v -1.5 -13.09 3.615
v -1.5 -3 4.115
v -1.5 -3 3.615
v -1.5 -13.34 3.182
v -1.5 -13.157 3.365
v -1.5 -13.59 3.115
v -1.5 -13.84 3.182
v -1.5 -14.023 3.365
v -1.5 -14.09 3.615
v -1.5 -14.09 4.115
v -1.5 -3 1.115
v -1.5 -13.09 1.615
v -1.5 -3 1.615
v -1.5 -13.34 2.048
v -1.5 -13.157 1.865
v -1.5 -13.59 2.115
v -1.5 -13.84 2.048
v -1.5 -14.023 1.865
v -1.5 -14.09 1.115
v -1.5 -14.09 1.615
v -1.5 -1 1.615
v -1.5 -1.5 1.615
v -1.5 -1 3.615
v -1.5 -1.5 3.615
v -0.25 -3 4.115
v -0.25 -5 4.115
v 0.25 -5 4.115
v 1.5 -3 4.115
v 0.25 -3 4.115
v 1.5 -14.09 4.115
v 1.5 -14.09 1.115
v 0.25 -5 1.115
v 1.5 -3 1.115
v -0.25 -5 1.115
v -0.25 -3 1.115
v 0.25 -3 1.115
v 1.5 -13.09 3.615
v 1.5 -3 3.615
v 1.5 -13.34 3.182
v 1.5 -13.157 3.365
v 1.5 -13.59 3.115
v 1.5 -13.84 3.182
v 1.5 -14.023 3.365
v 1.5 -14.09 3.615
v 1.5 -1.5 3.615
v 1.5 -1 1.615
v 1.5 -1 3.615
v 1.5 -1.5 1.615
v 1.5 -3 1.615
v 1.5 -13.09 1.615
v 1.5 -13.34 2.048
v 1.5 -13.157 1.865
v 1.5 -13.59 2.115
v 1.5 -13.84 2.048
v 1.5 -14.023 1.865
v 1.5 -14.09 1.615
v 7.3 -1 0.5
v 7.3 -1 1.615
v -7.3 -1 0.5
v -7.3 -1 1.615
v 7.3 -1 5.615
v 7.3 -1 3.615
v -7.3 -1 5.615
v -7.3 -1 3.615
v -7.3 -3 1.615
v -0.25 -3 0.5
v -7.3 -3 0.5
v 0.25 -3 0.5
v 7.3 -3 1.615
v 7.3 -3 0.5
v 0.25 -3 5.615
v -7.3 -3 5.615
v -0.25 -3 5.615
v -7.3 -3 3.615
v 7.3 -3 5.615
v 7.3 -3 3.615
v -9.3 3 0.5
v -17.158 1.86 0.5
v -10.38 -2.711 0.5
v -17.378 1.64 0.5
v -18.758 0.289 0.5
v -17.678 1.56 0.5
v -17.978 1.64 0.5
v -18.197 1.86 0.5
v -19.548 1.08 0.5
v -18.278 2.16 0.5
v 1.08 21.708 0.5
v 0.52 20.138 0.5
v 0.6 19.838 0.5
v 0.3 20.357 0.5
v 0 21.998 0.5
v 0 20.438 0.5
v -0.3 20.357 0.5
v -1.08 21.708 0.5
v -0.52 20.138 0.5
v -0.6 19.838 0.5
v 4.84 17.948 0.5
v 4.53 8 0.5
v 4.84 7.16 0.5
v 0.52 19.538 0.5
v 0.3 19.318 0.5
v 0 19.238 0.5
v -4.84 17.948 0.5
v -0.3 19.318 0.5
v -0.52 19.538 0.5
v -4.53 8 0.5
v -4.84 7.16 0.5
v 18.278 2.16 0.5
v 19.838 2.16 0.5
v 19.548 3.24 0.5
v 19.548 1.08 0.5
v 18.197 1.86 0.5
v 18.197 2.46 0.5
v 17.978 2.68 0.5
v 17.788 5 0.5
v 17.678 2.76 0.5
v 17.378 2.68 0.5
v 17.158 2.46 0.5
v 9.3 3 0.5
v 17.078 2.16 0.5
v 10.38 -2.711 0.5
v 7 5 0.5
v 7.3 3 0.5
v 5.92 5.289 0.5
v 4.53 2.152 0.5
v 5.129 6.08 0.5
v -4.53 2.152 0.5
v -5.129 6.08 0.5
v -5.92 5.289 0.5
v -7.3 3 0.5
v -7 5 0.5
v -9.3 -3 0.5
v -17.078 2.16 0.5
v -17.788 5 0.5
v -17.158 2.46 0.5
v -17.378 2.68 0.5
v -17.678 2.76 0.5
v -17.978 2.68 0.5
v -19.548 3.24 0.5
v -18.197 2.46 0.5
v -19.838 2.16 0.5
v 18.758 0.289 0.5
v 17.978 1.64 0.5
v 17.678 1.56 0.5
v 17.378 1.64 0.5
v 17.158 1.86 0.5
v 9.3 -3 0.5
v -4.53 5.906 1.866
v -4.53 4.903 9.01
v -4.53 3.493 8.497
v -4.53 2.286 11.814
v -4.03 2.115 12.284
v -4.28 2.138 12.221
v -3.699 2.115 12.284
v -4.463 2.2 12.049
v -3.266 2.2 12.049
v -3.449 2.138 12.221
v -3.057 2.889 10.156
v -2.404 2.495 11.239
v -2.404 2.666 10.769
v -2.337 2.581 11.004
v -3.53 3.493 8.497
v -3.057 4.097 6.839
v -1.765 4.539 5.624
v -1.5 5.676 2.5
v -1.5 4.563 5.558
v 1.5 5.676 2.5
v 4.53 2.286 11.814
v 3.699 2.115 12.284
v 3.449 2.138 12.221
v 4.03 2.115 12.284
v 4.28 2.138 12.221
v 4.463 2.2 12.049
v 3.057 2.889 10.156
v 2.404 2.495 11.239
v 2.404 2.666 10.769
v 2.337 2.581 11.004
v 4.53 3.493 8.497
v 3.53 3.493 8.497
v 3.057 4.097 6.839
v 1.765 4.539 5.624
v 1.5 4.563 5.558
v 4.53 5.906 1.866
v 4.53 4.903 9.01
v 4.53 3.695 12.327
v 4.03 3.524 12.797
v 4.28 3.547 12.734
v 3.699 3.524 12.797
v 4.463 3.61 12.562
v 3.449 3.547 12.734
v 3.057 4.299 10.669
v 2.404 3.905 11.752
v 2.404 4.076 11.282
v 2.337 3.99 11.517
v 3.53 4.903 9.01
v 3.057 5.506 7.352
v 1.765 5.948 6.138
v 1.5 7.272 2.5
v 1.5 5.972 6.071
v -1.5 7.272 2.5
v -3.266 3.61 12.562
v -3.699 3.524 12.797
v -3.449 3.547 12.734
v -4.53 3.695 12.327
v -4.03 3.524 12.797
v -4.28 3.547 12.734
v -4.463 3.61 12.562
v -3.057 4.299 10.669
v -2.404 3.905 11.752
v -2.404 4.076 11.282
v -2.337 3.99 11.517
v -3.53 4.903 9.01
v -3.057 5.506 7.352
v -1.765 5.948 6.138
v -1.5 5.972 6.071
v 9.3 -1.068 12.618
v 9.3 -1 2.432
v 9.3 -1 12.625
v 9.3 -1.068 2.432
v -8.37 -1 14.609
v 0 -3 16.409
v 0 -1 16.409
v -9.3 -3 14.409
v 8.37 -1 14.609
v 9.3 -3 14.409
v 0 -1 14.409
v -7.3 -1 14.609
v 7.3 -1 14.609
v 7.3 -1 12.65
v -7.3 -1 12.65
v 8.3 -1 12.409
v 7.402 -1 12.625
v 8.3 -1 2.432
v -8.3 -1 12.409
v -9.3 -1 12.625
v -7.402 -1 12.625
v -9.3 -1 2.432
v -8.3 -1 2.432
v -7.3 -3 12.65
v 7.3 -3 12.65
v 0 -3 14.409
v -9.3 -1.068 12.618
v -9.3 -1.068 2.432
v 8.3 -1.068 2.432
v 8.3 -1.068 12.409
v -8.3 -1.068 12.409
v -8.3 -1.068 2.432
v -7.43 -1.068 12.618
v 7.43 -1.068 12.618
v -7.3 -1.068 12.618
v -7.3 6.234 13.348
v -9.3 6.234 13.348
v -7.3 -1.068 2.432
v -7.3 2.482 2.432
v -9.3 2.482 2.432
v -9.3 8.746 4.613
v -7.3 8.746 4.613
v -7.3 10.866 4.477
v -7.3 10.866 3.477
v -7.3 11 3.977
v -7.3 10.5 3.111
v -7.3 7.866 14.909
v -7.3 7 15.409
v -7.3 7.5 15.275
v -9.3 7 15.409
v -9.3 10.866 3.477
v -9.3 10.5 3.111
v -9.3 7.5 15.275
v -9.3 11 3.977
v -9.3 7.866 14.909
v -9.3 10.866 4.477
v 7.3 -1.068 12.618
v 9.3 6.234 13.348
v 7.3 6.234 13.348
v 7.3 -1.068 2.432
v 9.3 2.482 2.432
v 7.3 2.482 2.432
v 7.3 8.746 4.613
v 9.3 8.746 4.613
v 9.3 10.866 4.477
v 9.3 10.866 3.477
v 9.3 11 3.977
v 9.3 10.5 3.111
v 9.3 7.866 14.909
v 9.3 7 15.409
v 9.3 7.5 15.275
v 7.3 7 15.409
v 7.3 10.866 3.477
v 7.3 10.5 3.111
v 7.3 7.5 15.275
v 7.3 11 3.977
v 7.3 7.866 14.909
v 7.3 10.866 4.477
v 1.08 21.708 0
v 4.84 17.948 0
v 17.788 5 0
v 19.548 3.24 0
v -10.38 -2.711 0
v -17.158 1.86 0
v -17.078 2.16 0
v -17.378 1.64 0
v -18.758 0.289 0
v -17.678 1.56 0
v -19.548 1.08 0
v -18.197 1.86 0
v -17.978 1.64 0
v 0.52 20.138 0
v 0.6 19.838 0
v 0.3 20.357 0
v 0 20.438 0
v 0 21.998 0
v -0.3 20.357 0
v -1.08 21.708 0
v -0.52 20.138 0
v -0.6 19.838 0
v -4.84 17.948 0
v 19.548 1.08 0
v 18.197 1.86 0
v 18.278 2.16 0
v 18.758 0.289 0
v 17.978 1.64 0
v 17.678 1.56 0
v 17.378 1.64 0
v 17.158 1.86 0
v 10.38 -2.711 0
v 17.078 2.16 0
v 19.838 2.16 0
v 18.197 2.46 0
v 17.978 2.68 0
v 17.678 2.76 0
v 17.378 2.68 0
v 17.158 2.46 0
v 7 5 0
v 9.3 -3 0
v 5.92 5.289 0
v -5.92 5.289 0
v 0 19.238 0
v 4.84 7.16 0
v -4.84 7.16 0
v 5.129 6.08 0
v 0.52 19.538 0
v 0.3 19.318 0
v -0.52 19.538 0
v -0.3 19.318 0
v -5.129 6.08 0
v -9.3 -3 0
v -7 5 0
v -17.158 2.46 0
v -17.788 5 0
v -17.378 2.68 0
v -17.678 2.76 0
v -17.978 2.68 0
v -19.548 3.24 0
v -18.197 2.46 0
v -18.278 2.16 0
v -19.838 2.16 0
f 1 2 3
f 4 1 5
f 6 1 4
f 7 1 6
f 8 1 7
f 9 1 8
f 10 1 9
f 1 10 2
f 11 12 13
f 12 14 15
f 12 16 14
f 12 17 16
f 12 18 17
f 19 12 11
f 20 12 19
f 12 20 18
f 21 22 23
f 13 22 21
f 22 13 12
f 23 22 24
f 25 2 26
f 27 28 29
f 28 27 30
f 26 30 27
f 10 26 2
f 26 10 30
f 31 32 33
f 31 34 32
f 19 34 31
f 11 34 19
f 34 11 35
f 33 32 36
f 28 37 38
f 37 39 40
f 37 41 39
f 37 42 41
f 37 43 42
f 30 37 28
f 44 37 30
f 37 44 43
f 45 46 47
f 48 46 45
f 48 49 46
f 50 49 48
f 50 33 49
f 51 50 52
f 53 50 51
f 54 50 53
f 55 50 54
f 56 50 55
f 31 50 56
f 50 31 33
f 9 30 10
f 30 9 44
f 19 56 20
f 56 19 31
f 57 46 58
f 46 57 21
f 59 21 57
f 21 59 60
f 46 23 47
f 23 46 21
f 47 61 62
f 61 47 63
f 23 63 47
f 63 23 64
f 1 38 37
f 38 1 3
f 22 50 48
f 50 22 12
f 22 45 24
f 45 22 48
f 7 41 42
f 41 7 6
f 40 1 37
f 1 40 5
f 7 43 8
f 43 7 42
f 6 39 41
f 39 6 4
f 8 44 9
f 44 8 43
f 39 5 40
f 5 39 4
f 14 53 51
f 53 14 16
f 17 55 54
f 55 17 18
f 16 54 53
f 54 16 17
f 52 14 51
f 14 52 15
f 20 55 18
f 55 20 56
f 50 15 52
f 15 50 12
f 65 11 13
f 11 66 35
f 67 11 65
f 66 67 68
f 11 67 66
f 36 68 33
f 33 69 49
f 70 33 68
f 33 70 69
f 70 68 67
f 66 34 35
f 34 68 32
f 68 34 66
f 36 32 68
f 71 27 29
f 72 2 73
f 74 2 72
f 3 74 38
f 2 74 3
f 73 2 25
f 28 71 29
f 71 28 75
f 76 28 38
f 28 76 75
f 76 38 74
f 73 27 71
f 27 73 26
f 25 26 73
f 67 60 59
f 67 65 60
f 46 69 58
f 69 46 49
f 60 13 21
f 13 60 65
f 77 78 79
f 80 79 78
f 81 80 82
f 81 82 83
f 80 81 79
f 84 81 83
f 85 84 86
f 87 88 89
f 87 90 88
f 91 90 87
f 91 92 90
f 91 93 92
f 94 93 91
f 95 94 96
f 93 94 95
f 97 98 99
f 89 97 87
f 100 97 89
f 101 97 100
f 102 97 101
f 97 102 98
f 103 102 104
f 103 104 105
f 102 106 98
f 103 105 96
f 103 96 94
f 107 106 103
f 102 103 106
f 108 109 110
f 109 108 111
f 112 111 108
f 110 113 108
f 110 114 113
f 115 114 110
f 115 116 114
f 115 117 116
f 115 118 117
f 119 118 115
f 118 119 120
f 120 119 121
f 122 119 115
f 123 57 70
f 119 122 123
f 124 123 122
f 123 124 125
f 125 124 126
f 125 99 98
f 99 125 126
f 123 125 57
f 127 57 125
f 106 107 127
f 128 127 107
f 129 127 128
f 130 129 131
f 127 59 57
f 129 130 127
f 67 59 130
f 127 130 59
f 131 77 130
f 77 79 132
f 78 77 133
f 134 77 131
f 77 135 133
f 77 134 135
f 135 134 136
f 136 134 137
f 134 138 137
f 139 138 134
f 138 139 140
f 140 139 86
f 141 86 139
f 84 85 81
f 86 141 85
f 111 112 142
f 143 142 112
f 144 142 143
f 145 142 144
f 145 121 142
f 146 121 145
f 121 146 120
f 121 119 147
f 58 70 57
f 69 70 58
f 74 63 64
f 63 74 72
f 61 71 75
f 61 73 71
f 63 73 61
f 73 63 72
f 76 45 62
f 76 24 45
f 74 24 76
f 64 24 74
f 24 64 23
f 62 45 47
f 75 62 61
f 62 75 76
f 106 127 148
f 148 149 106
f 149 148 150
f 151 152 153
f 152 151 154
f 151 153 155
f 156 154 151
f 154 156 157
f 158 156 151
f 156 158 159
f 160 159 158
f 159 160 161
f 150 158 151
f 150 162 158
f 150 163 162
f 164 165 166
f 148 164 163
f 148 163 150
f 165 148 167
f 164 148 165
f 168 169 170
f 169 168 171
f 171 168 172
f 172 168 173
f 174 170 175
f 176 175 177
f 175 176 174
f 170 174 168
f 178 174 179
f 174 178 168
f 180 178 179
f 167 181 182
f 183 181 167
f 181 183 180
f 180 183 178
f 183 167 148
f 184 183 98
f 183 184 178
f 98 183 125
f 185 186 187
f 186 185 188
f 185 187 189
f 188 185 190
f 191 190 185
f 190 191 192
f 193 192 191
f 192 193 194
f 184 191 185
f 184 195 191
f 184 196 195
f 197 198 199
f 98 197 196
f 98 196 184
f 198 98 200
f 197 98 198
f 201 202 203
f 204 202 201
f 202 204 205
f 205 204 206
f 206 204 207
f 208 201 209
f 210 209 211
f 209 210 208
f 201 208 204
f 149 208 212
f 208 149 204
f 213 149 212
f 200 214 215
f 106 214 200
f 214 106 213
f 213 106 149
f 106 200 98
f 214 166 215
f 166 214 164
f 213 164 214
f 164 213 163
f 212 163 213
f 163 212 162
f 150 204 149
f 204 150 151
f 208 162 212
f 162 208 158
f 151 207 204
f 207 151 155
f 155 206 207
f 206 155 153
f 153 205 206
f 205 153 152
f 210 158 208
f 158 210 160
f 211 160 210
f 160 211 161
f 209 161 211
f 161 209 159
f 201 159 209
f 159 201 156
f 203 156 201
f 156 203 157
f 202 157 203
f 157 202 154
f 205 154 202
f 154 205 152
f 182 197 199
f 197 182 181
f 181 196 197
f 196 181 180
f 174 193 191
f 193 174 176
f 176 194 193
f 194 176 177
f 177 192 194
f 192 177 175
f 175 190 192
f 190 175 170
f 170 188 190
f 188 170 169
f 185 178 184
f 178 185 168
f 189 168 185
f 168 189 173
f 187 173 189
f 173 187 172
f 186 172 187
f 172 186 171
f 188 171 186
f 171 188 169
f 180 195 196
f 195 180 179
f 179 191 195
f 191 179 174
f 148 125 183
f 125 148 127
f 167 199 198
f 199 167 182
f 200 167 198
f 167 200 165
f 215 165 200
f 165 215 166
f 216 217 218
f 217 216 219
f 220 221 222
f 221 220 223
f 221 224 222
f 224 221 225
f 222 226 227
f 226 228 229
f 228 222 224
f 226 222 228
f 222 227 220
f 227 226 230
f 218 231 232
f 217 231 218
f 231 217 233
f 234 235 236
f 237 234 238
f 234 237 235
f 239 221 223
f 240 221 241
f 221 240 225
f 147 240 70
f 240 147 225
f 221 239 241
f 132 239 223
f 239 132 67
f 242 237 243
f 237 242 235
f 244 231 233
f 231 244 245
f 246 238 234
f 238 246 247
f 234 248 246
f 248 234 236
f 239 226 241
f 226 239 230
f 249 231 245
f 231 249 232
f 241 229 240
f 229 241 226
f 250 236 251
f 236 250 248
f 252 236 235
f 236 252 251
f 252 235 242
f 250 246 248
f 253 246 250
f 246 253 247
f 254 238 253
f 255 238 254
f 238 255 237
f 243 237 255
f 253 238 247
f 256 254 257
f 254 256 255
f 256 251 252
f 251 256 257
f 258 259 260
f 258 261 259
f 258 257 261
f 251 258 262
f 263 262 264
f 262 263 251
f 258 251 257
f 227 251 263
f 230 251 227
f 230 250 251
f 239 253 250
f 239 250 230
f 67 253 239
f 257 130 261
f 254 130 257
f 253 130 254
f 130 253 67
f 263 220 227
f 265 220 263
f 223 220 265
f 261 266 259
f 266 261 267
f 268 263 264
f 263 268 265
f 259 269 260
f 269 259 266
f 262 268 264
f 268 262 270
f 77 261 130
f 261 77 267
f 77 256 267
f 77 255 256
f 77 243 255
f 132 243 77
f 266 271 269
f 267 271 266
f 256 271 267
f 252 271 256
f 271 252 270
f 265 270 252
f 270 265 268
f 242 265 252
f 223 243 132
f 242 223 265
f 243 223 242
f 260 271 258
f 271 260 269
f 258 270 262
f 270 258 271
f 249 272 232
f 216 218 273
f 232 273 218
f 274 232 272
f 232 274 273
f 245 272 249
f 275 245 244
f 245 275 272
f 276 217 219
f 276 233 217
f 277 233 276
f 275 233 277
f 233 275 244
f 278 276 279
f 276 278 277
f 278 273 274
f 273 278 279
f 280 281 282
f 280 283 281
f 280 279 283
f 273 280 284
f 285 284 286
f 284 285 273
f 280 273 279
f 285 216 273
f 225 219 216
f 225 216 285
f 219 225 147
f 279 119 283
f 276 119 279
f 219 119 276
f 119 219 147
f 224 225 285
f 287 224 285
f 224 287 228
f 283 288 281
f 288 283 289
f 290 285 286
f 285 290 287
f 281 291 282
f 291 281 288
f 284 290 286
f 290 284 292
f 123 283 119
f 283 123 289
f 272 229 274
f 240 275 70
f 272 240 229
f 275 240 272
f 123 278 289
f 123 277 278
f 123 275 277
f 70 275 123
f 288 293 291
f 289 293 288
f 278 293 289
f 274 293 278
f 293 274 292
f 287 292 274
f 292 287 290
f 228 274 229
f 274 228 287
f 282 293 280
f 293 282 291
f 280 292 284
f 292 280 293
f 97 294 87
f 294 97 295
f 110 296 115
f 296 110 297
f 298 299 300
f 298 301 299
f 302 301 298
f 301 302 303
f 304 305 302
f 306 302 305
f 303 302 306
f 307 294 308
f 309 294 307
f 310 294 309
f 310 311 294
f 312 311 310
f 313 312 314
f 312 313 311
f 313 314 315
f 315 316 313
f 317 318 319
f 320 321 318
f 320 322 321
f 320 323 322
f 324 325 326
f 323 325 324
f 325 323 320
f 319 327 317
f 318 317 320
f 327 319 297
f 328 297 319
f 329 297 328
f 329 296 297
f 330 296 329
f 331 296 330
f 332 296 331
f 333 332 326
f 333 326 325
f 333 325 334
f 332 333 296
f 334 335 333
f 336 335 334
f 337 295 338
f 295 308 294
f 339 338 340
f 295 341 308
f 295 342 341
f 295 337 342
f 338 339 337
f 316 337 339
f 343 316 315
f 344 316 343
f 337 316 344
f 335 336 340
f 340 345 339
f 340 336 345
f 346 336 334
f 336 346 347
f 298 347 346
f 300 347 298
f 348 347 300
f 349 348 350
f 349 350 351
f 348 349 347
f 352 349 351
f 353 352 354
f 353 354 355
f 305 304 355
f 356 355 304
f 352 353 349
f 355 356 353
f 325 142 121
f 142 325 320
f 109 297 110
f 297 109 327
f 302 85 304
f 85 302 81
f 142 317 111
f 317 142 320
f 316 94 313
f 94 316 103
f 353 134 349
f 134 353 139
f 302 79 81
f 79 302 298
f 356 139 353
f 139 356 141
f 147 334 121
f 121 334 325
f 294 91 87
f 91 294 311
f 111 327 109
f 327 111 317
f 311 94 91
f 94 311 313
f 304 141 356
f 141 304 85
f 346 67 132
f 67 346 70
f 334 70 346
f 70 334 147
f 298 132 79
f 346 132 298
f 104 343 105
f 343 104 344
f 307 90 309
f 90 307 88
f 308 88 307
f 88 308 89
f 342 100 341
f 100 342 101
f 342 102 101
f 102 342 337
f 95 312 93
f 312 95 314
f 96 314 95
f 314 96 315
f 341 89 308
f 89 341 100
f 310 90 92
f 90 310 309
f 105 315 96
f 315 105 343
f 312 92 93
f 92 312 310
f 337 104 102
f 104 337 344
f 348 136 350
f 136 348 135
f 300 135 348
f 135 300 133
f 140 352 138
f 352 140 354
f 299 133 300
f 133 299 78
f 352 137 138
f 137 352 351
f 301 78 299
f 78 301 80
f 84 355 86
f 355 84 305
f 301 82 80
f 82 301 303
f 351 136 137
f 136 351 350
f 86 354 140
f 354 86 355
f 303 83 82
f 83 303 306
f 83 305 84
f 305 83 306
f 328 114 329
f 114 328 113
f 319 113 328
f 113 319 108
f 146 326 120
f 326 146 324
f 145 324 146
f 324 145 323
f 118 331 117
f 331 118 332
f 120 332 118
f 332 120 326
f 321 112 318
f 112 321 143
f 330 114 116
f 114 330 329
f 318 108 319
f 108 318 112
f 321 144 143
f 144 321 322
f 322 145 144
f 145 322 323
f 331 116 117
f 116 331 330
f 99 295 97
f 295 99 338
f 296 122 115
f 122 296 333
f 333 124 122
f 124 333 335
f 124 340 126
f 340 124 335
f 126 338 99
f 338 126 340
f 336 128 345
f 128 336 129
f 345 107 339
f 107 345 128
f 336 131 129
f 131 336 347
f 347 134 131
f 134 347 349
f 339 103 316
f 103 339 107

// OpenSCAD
$fn = 12;

union() {
	translate(v = [0, -3, 0]) {
		union() {
			translate(v = [0, 2, 0.5000000000]) {
				rotate(a = [0, 0, 180]) {
					union() {
						translate(v = [-7.3000000000, 0, 0]) {
							cube(size = [14.6000000000, 2, 1.1150000000]);
						}
						translate(v = [-1.5000000000, 0, 0.6150000000]) {
							union() {
								difference() {
									cube(size = [3, 13.0900000000, 3.0000000000]);
									translate(v = [0, 0.5000000000, 0.5000000000]) {
										cube(size = [5, 13.0900000000, 2]);
									}
								}
								translate(v = [0, 12.5900000000, 2.5000000000]) {
									rotate(a = [0, 90, 0]) {
										cylinder(h = 3, r = 0.5000000000);
									}
								}
								translate(v = [0, 12.5900000000, 0.5000000000]) {
									rotate(a = [0, 90, 0]) {
										cylinder(h = 3, r = 0.5000000000);
									}
								}
								translate(v = [1.2500000000, 4, 0]) {
									rotate(a = [0, 180, 180]) {
										polyhedron(faces = [[0, 1, 2, 3], [5, 4, 3, 2], [0, 4, 5, 1], [0, 3, 4], [5, 2, 1]], points = [[0, 0, 0], [0.5000000000, 0, 0], [0.5000000000, 2, 0], [0, 2, 0], [0, 2, 0.6150000000], [0.5000000000, 2, 0.6150000000]]);
									}
								}
								translate(v = [1.7500000000, 4, 3.0000000000]) {
									rotate(a = [0, 0, 180]) {
										polyhedron(faces = [[0, 1, 2, 3], [5, 4, 3, 2], [0, 4, 5, 1], [0, 3, 4], [5, 2, 1]], points = [[0, 0, 0], [0.5000000000, 0, 0], [0.5000000000, 2, 0], [0, 2, 0], [0, 2, 1.5000000000], [0.5000000000, 2, 1.5000000000]]);
									}
								}
							}
						}
						translate(v = [-7.3000000000, 0, 3.1150000000]) {
							cube(size = [14.6000000000, 2, 2]);
						}
					}
				}
			}
			translate(v = [0, 11, 0.5000000000]) {
				translate(v = [-4.5300000000, 0, 0]) {
					difference() {
						rotate(a = [110, 0, 0]) {
							difference() {
								union() {
									translate(v = [0.5000000000, 0.5000000000, 0]) {
										minkowski() {
											difference() {
												difference() {
													translate(v = [0, 0, 0]) {
														cube(size = [8.0600000000, 12.0863946164, 0.7500000000]);
													}
													translate(v = [4.0300000000, 8.5563946164, 0]) {
														cylinder(h = 1.5000000000, r = 4.0300000000);
													}
												}
												translate(v = [4.0300000000, 14.0863946164, 0]) {
													rotate(a = [0, 0, 45]) {
														cube(center = true, size = [8.0600000000, 8.0600000000, 8.0600000000]);
													}
												}
											}
											cylinder(h = 0.7500000000, r = 0.5000000000);
										}
									}
									translate(v = [0, 0, 0]) {
										cube(size = [9.0600000000, 2, 10]);
									}
								}
								rotate(a = [-20, 0, 0]) {
									translate(v = [0, -20, 0]) {
										cube(size = [9.0600000000, 20, 20]);
									}
								}
							}
						}
						translate(v = [3.0300000000, -500, 2]) {
							cube(size = [3, 1000, 1000]);
						}
					}
				}
			}
			translate(v = [0, 0, 0]) {
				translate(v = [0, 0, 0.5000000000]) {
					#rotate(a = [90, 0, 180]) {
						union() {
							difference() {
								hull() {
									translate(v = [0, 6.9542764379, 1.0000000000]) {
										cube(center = true, size = [18.6000000000, 13.9085528757, 2]);
									}
									translate(v = [0, 14.9085528757, 0]) {
										cylinder(h = 2, r = 1.0000000000);
									}
								}
								translate(v = [0, 0, 0]) {
									color(c = [0, 0, 1]) {
										hull() {
											translate(v = [0, 5.9542764379, 1.0000000000]) {
												cube(center = true, size = [16.6000000000, 11.9085528757, 2]);
											}
											translate(v = [0, 12.9085528757, 0]) {
												cylinder(h = 2, r = 1.0000000000);
											}
										}
									}
								}
							}
							translate(v = [8.3000000000, 0, 0]) {
								intersection() {
									hull() {
										color(c = [1, 0, 0]) {
											translate(v = [0, 6.9542764379, 1.0000000000]) {
												cube(center = true, size = [2, 13.9085528757, 2]);
											}
										}
										translate(v = [-1.0000000000, 13.9085528757, 10]) {
											rotate(a = [0, 90, 0]) {
												cylinder(h = 2, r = 1.0000000000);
											}
										}
										translate(v = [-1.0000000000, 3.4771382189, 13]) {
											rotate(a = [0, 90, 0]) {
												cylinder(h = 2, r = 1.0000000000);
											}
										}
										translate(v = [0, 1.0000000000, 3.0000000000]) {
											cube(center = true, size = [2, 2, 6.0000000000]);
										}
									}
									minkowski() {
										difference() {
											translate(v = [-1.0000000000, -2, -2]) {
												cube(size = [2, 100, 100]);
											}
											hull() {
												color(c = [1, 0, 0]) {
													translate(v = [0, 6.9542764379, 1.0000000000]) {
														cube(center = true, size = [2, 13.9085528757, 2]);
													}
												}
												translate(v = [-1.0000000000, 13.9085528757, 10]) {
													rotate(a = [0, 90, 0]) {
														cylinder(h = 2, r = 1.0000000000);
													}
												}
												translate(v = [-1.0000000000, 3.4771382189, 13]) {
													rotate(a = [0, 90, 0]) {
														cylinder(h = 2, r = 1.0000000000);
													}
												}
												translate(v = [0, 1.0000000000, 3.0000000000]) {
													cube(center = true, size = [2, 2, 6.0000000000]);
												}
											}
										}
										sphere(r = 2);
									}
								}
							}
							translate(v = [-8.3000000000, 0, 0]) {
								intersection() {
									hull() {
										color(c = [1, 0, 0]) {
											translate(v = [0, 6.9542764379, 1.0000000000]) {
												cube(center = true, size = [2, 13.9085528757, 2]);
											}
										}
										translate(v = [-1.0000000000, 13.9085528757, 10]) {
											rotate(a = [0, 90, 0]) {
												cylinder(h = 2, r = 1.0000000000);
											}
										}
										translate(v = [-1.0000000000, 3.4771382189, 13]) {
											rotate(a = [0, 90, 0]) {
												cylinder(h = 2, r = 1.0000000000);
											}
										}
										translate(v = [0, 1.0000000000, 3.0000000000]) {
											cube(center = true, size = [2, 2, 6.0000000000]);
										}
									}
									minkowski() {
										difference() {
											translate(v = [-1.0000000000, -2, -2]) {
												cube(size = [2, 100, 100]);
											}
											hull() {
												color(c = [1, 0, 0]) {
													translate(v = [0, 6.9542764379, 1.0000000000]) {
														cube(center = true, size = [2, 13.9085528757, 2]);
													}
												}
												translate(v = [-1.0000000000, 13.9085528757, 10]) {
													rotate(a = [0, 90, 0]) {
														cylinder(h = 2, r = 1.0000000000);
													}
												}
												translate(v = [-1.0000000000, 3.4771382189, 13]) {
													rotate(a = [0, 90, 0]) {
														cylinder(h = 2, r = 1.0000000000);
													}
												}
												translate(v = [0, 1.0000000000, 3.0000000000]) {
													cube(center = true, size = [2, 2, 6.0000000000]);
												}
											}
										}
										sphere(r = 2);
									}
								}
							}
						}
					}
				}
			}
		}
	}
	rotate(a = [0, 0, 0]) {
		color(c = [0, 1, 0]) {
			translate(v = [0, 2.1600000000, 0]) {
				difference() {
					difference() {
						difference() {
							difference() {
								difference() {
									hull() {
										translate(v = [0, 17.6776695297, 0]) {
											cylinder(h = 0.5000000000, r = 2.1600000000);
										}
										translate(v = [-17.6776695297, 0, 0]) {
											cylinder(h = 0.5000000000, r = 2.1600000000);
										}
										translate(v = [17.6776695297, 0, 0]) {
											cylinder(h = 0.5000000000, r = 2.1600000000);
										}
										translate(v = [9.3000000000, -3, 0]) {
											cylinder(h = 0.5000000000, r = 2.1600000000);
										}
										translate(v = [-9.3000000000, -3, 0]) {
											cylinder(h = 0.5000000000, r = 2.1600000000);
										}
									}
									translate(v = [0, 17.6776695297, -1]) {
										cylinder(h = 102, r = 0.6000000000);
									}
								}
								translate(v = [-17.6776695297, 0, -1]) {
									cylinder(h = 102, r = 0.6000000000);
								}
							}
							translate(v = [17.6776695297, 0, -1]) {
								cylinder(h = 102, r = 0.6000000000);
							}
						}
						translate(v = [7, 5, 0]) {
							minkowski() {
								cube(size = [20, 20, 5]);
								cylinder(h = 0.5000000000, r = 2.1600000000);
							}
						}
					}
					translate(v = [-27, 5, 0]) {
						minkowski() {
							cube(size = [20, 20, 5]);
							cylinder(h = 0.5000000000, r = 2.1600000000);
						}
					}
				}
			}
		}
	}
}
/***********************************************
*********      SolidPython code:      **********
************************************************
 
from solid import *
from solid.utils import *

from parts import *
from droneparts import *


SEGMENTS = 12 #48
DEFAULT_THICKNESS = 0.5







class CrazyponyInductrixCameraMount(object):
    clip_thickness = 0.5
    clip_radius = 0.5
    clip_barrel_length = 1.5/2.0

    tx_mount_support_w = 2
    tx_mount_w = 3
    tx_mount_slot = 2
    tx_mount_h =  DEFAULT_THICKNESS * 2 +  tx_mount_slot + clip_barrel_length + clip_thickness
    tx_mount_clip_l = CRAZYPONY_CAMERA_PCB_H #/2.0
    tx_mount_mounting_h = 0.5 + tx_mount_slot/2.0 + clip_barrel_length + clip_thickness 

    def __init__(self, angle=20):
        self.angle = angle

#def camera_mount_clip(clip_barrel_length, clip_barrel_radius, stopper_thickness):
#    clip = rotate([0, 90, 0]) (
#        cylinder(h=clip_barrel_length, r=clip_barrel_radius)
#    )
#    clip += translate([clip_barrel_length, 0, 0])(
#                hull()(rotate([0, 90, 0]) (cylinder(h=stopper_thickness, r=clip_barrel_radius)),
#                down(clip_barrel_radius*2)(
#                    rotate([0, 90, 0]) (cylinder(h=stopper_thickness, r=clip_barrel_radius))
#                )
#            )
#    )
#    return clip

    def tx_mount_snap(self, clip_w, slot_h, thickness = 0.5):

        snap_r = thickness
        clip_l = CRAZYPONY_CAMERA_PCB_H + (snap_r*2)
        
        bottom_support_h = DIPOLE_ANTENNA_R - (slot_h/2.0  + thickness)
        clip_h = thickness * 2.0 + slot_h
        bracket_thickness = thickness
        bracket_w = self.tx_mount_support_w 
        bottom_bracket_h = bottom_support_h - thickness 

        #Bottom support
        bottom_support = translate([-CRAZYPONY_CAMERA_PCB_W/2.0, 0, 0 ])(
                cube([CRAZYPONY_CAMERA_PCB_W, self.tx_mount_support_w, bottom_support_h])
        )
        #Top support
        top_support = translate([-CRAZYPONY_CAMERA_PCB_W/2.0, 0, bottom_support_h + slot_h])(
            cube([CRAZYPONY_CAMERA_PCB_W, self.tx_mount_support_w, self.tx_mount_support_w])
        )

        #Main piece where the tx will fit
        tx_clip =  difference()(
            cube([clip_w, clip_l, clip_h]),
            translate([0, thickness, thickness])(
                cube([clip_w+2, clip_l, slot_h])
            )
        )
        #Add snaps at the ends
        top_snap = translate([0,  clip_l-snap_r, clip_h-snap_r])(
            rotate([0, 90, 0])(
                cylinder(h=clip_w, r=thickness)
            )
        )
        bottom_snap = translate([0, clip_l-snap_r, snap_r])(
            rotate([0, 90, 0])(
                cylinder(h=clip_w, r=thickness)
            )
        )

        #Bracket top
        top_bracket = translate([bracket_thickness/2.0 + clip_w/2.0, bracket_w + self.tx_mount_support_w, clip_h])(
            rotate([0, 0, 180])(
                    prism( bracket_thickness, bracket_w,  self.tx_mount_support_w - thickness)
            )
        )

        #Bracket bottom
        bottom_bracket = translate([clip_w/2.0 - bracket_thickness/2.0, bracket_w + self.tx_mount_support_w, 0])(
            rotate([0, 180, 180])(
                prism( bracket_thickness, bracket_w,  bottom_bracket_h)
            )
        )
        
        clip_asm = translate([-clip_w/2.0, 0, bottom_support_h-thickness]) (
            union()(tx_clip, top_snap, bottom_snap,  bottom_bracket, top_bracket) 
        )

        return rotate([0, 0, 180])(union()(bottom_support, clip_asm, top_support))


    def camera_mount_snap(self, height, barrel_radius, barrel_length):

        thickness = barrel_length/ 2.0
#CRAZYPONY_LENS_H +
        h1 = math.sin(math.radians(self.angle)) * (CRAZYPONY_LENS_BARREL_H +  CRAZYPONY_CAMERA_PCB_THICKNESS)
        h2 = math.sin(math.radians(90 - self.angle)) * (CRAZYPONY_CAMERA_PCB_H/2.0)
        height = (h1 + h2)/math.sin(math.radians(90-self.angle))
#
        #Main body to hold lens

        rounding_r = 0.5
        #height = 10 #barrel_radius * 3 
        w_spacing = 2
        above_h = barrel_radius
        mount_width = barrel_radius*2.0 + 1 #*2.0 + w_spacing
        center_w = w_spacing
        insert_w = mount_width 
        w = mount_width + rounding_r * 2

        insert_x = 4.0
        top_offset =2 


        mount = translate([0, 0, 0]) (
                    cube([mount_width, height + above_h, thickness])
                #Have some overhang for the cut so it goes all the way through
                ) - translate([mount_width/2.0, height, 0]) (
                    cylinder(h=barrel_length , 
                             r=barrel_radius+rounding_r)
                #Cut out the top
                ) - translate([mount_width/2.0, height + above_h + top_offset, 0])(rotate([0, 0, 45])(
                    cube([insert_w, insert_w , insert_w], center=True)
                )                 )

        # heights are summed 
        mount = translate([rounding_r, rounding_r, 0])(
            minkowski()(
                mount,  
                    cylinder(h=thickness , 
                             r=rounding_r)
        )
        )

        support_w = 2
        mount += translate([0, 0, 0])(
            cube([w, support_w, 10])
        )

        #
        base_w =20#2 
        base_thickness = 4 
        back_l =3  
        base_l =20 #barrel_length + 3
        # mount = translate([0, height/2.0, 0])(mount)
        base = rotate([-self.angle, 0, 0])(
            translate([0, -base_w,  0])(
                cube([w, base_w, base_l])
            ))

        mount -= base
        mount = rotate([90 + self.angle, 0, 0])( mount)
#[w * 2 - (rounding_r*2)
#        mount += translate([0, 0, 0])(
#            mirror([1, 0, 0])(mount) )
        slit_w = 3 
        mount -= translate([w/2.0 - slit_w/2.0 , -500, 2])(
            cube([slit_w, 1000, 1000])
        )

#        snap_thickness = DEFAULT_THICKNESS
#     #   snap = translate([mount_width/2.0, height, 0])(
#        snap =      cylinder(h=barrel_length, r=snap_thickness) - translate([0, -snap_thickness, 0])(cube([snap_thickness*2, snap_thickness*2, barrel_length]))
#     #   )
#        mount += snap

#        #Add in the lift
#        lift_h = barrel_length #
#        lift_w = math.tan(math.radians(angle)) * lift_h 
#        lift_l = mount_width 
#        mount += color(Blue)(translate([mount_width/2, (height/2 + lift_w)*-1, barrel_length])(
#                    rotate([0, 180, 0])(
#                        prism(lift_l, lift_w, lift_h)
#                    )
#        ))
#
#        #Brackets
#        bracket_h = 2.0 
#        bracket_l = bracket_h / math.tan(math.radians(angle)) 
#
#        brackets_x = [DEFAULT_THICKNESS/2.0, mount_width/2.0,  -mount_width/2.0  +  DEFAULT_THICKNESS]
#
#        for x in brackets_x:
#            mount += color(Blue)(translate([x, (height/2 )*-1, 0])(
#                        rotate([0, 180, 0])(
#                            prism(DEFAULT_THICKNESS, bracket_h, bracket_l)
#                        )
#            ))
#
#        #recenter
        return translate([-w/2.0, 0, 0])(mount) #rotate([0, 0, 0])(mount) #  translate([0, -height/2.0, 0])(mount)


    def base(self, thickness):

        c = cylinder(h = thickness, r= INDUCTRIX_FC_MOUNTING_HOLE_OR)
        base = hull()(
            translate([0, INDUCTRIX_HOLE_TO_HOLE_W/2.0, 0]) (
                c
            ), 
#            translate([3, 3, 0]) (
#                c
#            ), 

#sides
            translate([-INDUCTRIX_HOLE_TO_HOLE_W/2.0, 0, 0]) (
                c
            ), 
            translate([INDUCTRIX_HOLE_TO_HOLE_W/2.0, 0, 0]) (
                c
            ), 

#Back
            translate([CRAZYPONY_CAMERA_PCB_W/2.0+2, -3, 0]) (
                c
            ),
            translate([-CRAZYPONY_CAMERA_PCB_W/2.0-2, -3, 0]) (
                c
            )
            
        ) 
        base = inductrix_fc_hole_puncher(base)

        side_cut = minkowski()(cube([20, 20, 5]), c)

        base -= translate([7, 5, 0])( side_cut)
        base -= translate([-27, 5, 0])( side_cut)
        return translate([0,  INDUCTRIX_FC_MOUNTING_HOLE_OR, 0])(base)


#    class cage():
#        def __init__(self):
#            self.h = None
#
    def _lift(self, w, h, l, angle):

        a =rotate([angle, 180, 0])(
            difference()(
            translate([-w/2.0, 0, 0])(
                cube([w, h, l])
            ),
            rotate([-mount_angle, 0, 0])(
                translate([-w/2.0, -h, 0])(
                    color(Blue)(cube([w + 2, h, l + 2]))
                )
            )
        )
        )

        z = h * math.cos(math.radians(90-angle))
        #z=0
        b = translate([0, 0, z])(a)
        c = translate([-w/2.0 - 1, 0,  -l])(cube([w+2, h, l]))
        return difference()(b, c)


    def _bumper(self, depth, h):


        #This is how far the bumper sticks out
        l = 6.0#h-3 

        r = 1.0
        top_z = 13
        second_z = 10


        #side piece attaching to body
        a = color(Red)(
            translate([0, h/2.0, depth/2.0])(
            cube([depth, h, depth], center=True))
            )
#
#       # higher
        b = translate([-depth/2.0, h, second_z])(
                rotate([0, 90, 0])(
            cylinder(h = depth, r = r),
        ))

        #low
        b2 = translate([-depth/2.0, h/4, top_z])(
                rotate([0, 90, 0])(
            cylinder(h = depth, r = r),
        ))

        #bottom
        c= translate([0, depth/2.0, l/2.0])(
            cube([depth, depth, l], center=True)
        )

        outside = hull()(a,b,b2,c)


        return shell(outside) #union()(outside, color(Blue)(inside))

    def _backing(self, w, h, depth):

        top_offset = 1
        r = 1.0
        back =    hull()(
        #part = union()(
                translate([0, h/2.0, depth/2.0])(
                    cube([w, h, depth], center=True)
                ),
                translate([0, h+top_offset, 0])(
                    cylinder(h = depth, r = r)
                )
                )

        t = 2 
        h -= t
        w -= t
        #depth += t
        cut =    hull()(
                translate([0, h/2.0, depth/2.0])(
                    cube([w, h, depth], center=True)
                ),
                translate([0, h+top_offset, 0])(
                    cylinder(h = depth, r = r)
                )
                )
        backing = difference()(
            back, 
            translate([0, 0, 0])(color(Blue)(cut)))
        return backing


    def cage(self):
        #height part of the camera
        lift_o = math.tan(math.radians(mount_angle)) * (CRAZYPONY_LENS_BARREL_H + CRAZYPONY_LENS_H + CRAZYPONY_CAMERA_PCB_THICKNESS)
        lens_hyp = lift_o + (CRAZYPONY_CAMERA_PCB_H/2.0) + CRAZYPONY_LENS_R 
        lens_o = lens_hyp * math.sin(math.radians(90 - mount_angle))
        h = lens_o 
        depth = 2 
        w = CRAZYPONY_CAMERA_PCB_W + (depth * 2)#Add bumbers

        return  rotate([90, 0, 180])(union()(
        self._backing(w, h, depth),  
                     translate([w/2.0 - depth/2.0, 0, 0])(
                         self._bumper(depth, h)
                     ),
                     translate([-w/2.0 + depth/2.0, 0, 0])(
                         self._bumper(depth, h)
                     ),

      #              self._lift(w, h/2.0, DEFAULT_THICKNESS, mount_angle)
                     )
        )

    def make(self):    
        h1 = math.hypot(CRAZYPONY_CAMERA_PCB_THICKNESS , CRAZYPONY_CAMERA_PCB_H/2.0)
        camera_y =  -5 
        base_thickness = DEFAULT_THICKNESS
        camera_tx_z = base_thickness + DIPOLE_ANTENNA_R
        # Add TX Mount
        tx_mount = translate([0, self.tx_mount_support_w, base_thickness])(# tx_mount_mounting_h + fc_thickness/2.0])( 
            self.tx_mount_snap(self.tx_mount_w,  self.tx_mount_slot)
        )

        base = rotate([0, 0, 0])(
            color(Green)(
                self.base(base_thickness)
            )
        )
        
        camera_mount = translate([0, 11, base_thickness])(
#        rotate([90 - mount_angle, 0, 0])(
            self.camera_mount_snap(h1 , CRAZYPONY_LENS_BARREL_R, CRAZYPONY_LENS_BARREL_H)
        ),
#        ),

        # Add cage
        cage = back(0)(
            up(base_thickness)(
                #rotate([90, 0, 0])(
                    debug(self.cage())
                #)
            )
        )

        a = union()(
            tx_mount, 
                      camera_mount,
                      cage,
        # Add camera mount
        )

        all = union()(back(3)(a), base)
        return all

def mount_camera():

    h1 = math.hypot(CRAZYPONY_CAMERA_PCB_THICKNESS , CRAZYPONY_CAMERA_PCB_H/2.0)

    m = union()(
        debug(
            crazypony_camera(CRAZYPONY_LENS_BARREL_H, CRAZYPONY_LENS_BARREL_R, CRAZYPONY_LENS_H, CRAZYPONY_LENS_R, CRAZYPONY_CAMERA_PCB_W, CRAZYPONY_CAMERA_PCB_H, CRAZYPONY_CAMERA_PCB_THICKNESS=CRAZYPONY_CAMERA_PCB_THICKNESS)),

        translate([0, 0, CRAZYPONY_CAMERA_PCB_THICKNESS])(
            camera_mount_snap(h1 , CRAZYPONY_LENS_BARREL_R, CRAZYPONY_LENS_BARREL_H)
        )
    )
    return translate([0, CRAZYPONY_CAMERA_PCB_H/2.0, 0])(m)


#def assembly():
#    camera_y =  -5 
#    camera_tx_z = fc_thickness + DIPOLE_ANTENNA_R
##(fc_thickness/2.0) + tx_mount_slot/2.0 + tx_mount_h - tx_mount_slot - DEFAULT_THICKNESS 
#    all = union()(
#            #Add Camera TX
#            translate([0, CRAZYPONY_CAMERA_PCB_H/2.0,camera_tx_z ])(
#                color(Blue)(
#                    camera_tx(DIPOLE_ANTENNA_L, DIPOLE_ANTENNA_R, CRAZYPONY_CAMERA_PCB_W, CRAZYPONY_CAMERA_PCB_H, tx_mount_slot))
#            ),
##        # Add TX Mount
#            translate([0, -(2), fc_thickness])(# tx_mount_mounting_h + fc_thickness/2.0])( 
#                tx_mount_snap(tx_mount_w, tx_mount_clip_l, tx_mount_slot)),
#
#
##        # Add the base 
#            rotate([0, 0, 180])(
#                color(Green)(
#                    base(DEFAULT_THICKNESS)
#                )
#            ),
#
#        translate([0, camera_y, fc_thickness])(
#                rotate([90 - mount_angle, 0, 0])(
#            mount_camera()
#        )),
#
#        debug(asm_cage(cage()()))
#    )
#    return all

def test():
    #Insert camera and tx
    pass

if __name__ == "__main__":

#all = assembly()
#all = camera_tx(DIPOLE_ANTENNA_L, DIPOLE_ANTENNA_R, CRAZYPONY_CAMERA_PCB_W, CRAZYPONY_CAMERA_PCB_H, tx_mount_slot)
#all = cage()()
#all = tx_mount_snap(tx_mount_w, tx_mount_slot)
#all = camera_mount(h , CRAZYPONY_LENS_BARREL_R, CRAZYPONY_LENS_BARREL_H)

    mount_angle = 20
    mount = CrazyponyInductrixCameraMount(mount_angle)
#    all = mount.base(DEFAULT_THICKNESS)
#
    h1 = math.hypot(CRAZYPONY_CAMERA_PCB_THICKNESS , CRAZYPONY_CAMERA_PCB_H/2.0)
    all = translate([-0, 0, 0])(mount.camera_mount_snap(h1, CRAZYPONY_LENS_BARREL_R, CRAZYPONY_LENS_BARREL_H))

    all = mount.make()
     #debug(
    camera =   translate([0, 4, DEFAULT_THICKNESS])(
        rotate([-(90-mount_angle), 0, 0])(
        translate([0, -CRAZYPONY_CAMERA_PCB_H/2.0, 0])(
            crazypony_camera()
        )
    )
    #)
    )
#    all += camera
    scad_render_to_file(all,  filepath= "crazypony-mount.scad", file_header='$fn = %s;' % SEGMENTS)



 
 
************************************************/
